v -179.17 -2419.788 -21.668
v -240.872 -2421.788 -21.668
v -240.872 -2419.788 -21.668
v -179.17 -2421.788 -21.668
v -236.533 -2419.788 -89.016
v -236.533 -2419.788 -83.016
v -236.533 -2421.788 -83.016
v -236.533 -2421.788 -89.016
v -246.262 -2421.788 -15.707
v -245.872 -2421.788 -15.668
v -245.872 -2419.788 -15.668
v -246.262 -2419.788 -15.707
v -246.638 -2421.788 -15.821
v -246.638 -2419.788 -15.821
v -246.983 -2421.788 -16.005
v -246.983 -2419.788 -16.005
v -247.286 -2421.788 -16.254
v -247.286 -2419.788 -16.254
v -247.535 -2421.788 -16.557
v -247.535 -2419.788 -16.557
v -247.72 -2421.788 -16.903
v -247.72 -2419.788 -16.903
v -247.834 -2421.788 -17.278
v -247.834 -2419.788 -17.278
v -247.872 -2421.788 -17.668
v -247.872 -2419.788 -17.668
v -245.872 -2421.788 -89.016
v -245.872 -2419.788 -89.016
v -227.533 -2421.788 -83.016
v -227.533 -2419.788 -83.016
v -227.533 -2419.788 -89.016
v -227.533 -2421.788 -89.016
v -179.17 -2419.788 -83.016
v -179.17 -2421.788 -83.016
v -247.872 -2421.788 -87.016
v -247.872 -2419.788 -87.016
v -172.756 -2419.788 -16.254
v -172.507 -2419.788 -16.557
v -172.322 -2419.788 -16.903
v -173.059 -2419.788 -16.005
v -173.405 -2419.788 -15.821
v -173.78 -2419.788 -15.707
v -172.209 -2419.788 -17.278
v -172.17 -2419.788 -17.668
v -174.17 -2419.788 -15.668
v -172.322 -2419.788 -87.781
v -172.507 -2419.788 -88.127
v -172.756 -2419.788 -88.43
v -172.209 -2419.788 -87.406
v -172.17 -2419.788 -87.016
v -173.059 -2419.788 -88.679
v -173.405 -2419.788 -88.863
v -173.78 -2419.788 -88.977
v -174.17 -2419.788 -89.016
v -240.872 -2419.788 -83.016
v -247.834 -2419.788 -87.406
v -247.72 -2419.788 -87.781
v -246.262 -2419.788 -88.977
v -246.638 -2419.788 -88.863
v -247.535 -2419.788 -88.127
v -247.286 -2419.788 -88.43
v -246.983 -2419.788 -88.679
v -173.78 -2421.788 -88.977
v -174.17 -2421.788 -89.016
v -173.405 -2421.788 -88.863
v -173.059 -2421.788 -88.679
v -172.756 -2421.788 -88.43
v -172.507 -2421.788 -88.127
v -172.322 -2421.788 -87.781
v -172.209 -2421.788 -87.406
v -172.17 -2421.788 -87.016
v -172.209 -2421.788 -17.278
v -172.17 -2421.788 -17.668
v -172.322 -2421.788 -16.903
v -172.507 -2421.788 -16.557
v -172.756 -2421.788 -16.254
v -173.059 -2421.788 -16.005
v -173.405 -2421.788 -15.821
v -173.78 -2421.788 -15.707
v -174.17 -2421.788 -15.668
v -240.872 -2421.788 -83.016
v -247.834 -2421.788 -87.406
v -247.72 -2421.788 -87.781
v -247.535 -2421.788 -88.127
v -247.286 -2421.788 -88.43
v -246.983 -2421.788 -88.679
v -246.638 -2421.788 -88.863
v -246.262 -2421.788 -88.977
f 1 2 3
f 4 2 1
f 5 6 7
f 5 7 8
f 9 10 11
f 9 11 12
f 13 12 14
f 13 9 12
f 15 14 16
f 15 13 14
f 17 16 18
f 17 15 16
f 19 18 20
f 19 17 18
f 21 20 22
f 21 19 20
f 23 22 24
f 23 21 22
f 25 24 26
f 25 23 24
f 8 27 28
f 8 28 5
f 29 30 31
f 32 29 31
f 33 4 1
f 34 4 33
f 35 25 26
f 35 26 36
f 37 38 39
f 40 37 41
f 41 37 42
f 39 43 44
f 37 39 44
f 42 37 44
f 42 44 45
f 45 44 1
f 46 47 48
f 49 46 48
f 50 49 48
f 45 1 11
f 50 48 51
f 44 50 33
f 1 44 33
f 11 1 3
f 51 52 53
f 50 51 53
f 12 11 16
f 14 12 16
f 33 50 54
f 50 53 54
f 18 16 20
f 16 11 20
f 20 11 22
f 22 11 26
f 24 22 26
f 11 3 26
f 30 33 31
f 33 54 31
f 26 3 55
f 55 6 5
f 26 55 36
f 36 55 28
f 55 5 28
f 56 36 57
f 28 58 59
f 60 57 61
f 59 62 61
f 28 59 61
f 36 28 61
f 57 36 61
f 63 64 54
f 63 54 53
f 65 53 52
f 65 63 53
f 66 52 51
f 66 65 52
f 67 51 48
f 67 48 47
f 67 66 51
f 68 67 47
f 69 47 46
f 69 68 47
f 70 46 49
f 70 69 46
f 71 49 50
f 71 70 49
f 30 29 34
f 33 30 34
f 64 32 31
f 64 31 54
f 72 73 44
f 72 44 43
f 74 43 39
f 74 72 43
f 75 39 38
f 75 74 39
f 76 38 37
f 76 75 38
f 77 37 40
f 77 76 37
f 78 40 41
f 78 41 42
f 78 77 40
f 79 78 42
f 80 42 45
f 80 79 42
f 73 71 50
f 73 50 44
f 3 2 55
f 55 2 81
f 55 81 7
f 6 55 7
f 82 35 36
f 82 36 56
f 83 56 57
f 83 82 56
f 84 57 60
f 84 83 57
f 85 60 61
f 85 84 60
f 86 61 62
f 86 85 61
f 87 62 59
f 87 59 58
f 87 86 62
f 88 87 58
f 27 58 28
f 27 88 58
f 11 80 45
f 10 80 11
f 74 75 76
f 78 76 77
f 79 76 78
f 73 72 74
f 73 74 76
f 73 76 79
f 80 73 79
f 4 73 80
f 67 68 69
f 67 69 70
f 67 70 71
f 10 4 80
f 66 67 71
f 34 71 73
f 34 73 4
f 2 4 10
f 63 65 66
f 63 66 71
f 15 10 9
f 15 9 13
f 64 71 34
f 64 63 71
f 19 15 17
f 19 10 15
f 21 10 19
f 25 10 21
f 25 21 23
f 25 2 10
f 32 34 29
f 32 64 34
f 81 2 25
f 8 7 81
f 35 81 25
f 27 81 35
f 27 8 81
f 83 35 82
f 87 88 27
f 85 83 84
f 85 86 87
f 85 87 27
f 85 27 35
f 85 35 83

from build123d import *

# Parameters (mm, degrees)
SKETCH_1_W          = 61.702142611
SKETCH_1_H          = 61.347239899
EXTRUDE_1_DEPTH     = 2
SKETCH_2_W          = 9
SKETCH_2_H          = 6
CUT_EXTRUDE_1_DEPTH = 2


with BuildPart() as part:
    # 草图1 → 凸台-拉伸1 (new body)
    with BuildSketch(Plane(origin=(-129.641159043, -2421.788142989, -243.940490516), x_dir=(1, 0, 0), z_dir=(0, 1, 0))):
        with BuildLine():
            Line((-116.231072015, -154.924864972), (-44.528929404, -154.924864972))
            ThreePointArc((-44.528929404, -154.924864972), (-43.114715842, -155.510651409), (-42.528929404, -156.924864972))
            Line((-42.528929404, -156.924864972), (-42.528929404, -226.272104871))
            ThreePointArc((-42.528929404, -226.272104871), (-43.114715842, -227.686318433), (-44.528929404, -228.272104871))
            Line((-44.528929404, -228.272104871), (-116.231072015, -228.272104871))
            ThreePointArc((-116.231072015, -228.272104871), (-117.645285578, -227.686318433), (-118.231072015, -226.272104871))
            Line((-118.231072015, -226.272104871), (-118.231072015, -156.924864972))
            ThreePointArc((-118.231072015, -156.924864972), (-117.645285578, -155.510651409), (-116.231072015, -154.924864972))
        make_face()
        with Locations((-80.38000071, -191.598484922)):
            Rectangle(SKETCH_1_W, SKETCH_1_H, mode=Mode.SUBTRACT)
    extrude(amount=EXTRUDE_1_DEPTH)

    # 草图2 → 切除-拉伸1 (cut)
    with BuildSketch(Plane(origin=(0, -2419.788142989, 0), x_dir=(1, 0, 0), z_dir=(0, 1, 0))):
        with Locations((-232.033164197, 86.015625544)):
            Rectangle(SKETCH_2_W, SKETCH_2_H)
    extrude(amount=-CUT_EXTRUDE_1_DEPTH, mode=Mode.SUBTRACT)


solid = part.part
